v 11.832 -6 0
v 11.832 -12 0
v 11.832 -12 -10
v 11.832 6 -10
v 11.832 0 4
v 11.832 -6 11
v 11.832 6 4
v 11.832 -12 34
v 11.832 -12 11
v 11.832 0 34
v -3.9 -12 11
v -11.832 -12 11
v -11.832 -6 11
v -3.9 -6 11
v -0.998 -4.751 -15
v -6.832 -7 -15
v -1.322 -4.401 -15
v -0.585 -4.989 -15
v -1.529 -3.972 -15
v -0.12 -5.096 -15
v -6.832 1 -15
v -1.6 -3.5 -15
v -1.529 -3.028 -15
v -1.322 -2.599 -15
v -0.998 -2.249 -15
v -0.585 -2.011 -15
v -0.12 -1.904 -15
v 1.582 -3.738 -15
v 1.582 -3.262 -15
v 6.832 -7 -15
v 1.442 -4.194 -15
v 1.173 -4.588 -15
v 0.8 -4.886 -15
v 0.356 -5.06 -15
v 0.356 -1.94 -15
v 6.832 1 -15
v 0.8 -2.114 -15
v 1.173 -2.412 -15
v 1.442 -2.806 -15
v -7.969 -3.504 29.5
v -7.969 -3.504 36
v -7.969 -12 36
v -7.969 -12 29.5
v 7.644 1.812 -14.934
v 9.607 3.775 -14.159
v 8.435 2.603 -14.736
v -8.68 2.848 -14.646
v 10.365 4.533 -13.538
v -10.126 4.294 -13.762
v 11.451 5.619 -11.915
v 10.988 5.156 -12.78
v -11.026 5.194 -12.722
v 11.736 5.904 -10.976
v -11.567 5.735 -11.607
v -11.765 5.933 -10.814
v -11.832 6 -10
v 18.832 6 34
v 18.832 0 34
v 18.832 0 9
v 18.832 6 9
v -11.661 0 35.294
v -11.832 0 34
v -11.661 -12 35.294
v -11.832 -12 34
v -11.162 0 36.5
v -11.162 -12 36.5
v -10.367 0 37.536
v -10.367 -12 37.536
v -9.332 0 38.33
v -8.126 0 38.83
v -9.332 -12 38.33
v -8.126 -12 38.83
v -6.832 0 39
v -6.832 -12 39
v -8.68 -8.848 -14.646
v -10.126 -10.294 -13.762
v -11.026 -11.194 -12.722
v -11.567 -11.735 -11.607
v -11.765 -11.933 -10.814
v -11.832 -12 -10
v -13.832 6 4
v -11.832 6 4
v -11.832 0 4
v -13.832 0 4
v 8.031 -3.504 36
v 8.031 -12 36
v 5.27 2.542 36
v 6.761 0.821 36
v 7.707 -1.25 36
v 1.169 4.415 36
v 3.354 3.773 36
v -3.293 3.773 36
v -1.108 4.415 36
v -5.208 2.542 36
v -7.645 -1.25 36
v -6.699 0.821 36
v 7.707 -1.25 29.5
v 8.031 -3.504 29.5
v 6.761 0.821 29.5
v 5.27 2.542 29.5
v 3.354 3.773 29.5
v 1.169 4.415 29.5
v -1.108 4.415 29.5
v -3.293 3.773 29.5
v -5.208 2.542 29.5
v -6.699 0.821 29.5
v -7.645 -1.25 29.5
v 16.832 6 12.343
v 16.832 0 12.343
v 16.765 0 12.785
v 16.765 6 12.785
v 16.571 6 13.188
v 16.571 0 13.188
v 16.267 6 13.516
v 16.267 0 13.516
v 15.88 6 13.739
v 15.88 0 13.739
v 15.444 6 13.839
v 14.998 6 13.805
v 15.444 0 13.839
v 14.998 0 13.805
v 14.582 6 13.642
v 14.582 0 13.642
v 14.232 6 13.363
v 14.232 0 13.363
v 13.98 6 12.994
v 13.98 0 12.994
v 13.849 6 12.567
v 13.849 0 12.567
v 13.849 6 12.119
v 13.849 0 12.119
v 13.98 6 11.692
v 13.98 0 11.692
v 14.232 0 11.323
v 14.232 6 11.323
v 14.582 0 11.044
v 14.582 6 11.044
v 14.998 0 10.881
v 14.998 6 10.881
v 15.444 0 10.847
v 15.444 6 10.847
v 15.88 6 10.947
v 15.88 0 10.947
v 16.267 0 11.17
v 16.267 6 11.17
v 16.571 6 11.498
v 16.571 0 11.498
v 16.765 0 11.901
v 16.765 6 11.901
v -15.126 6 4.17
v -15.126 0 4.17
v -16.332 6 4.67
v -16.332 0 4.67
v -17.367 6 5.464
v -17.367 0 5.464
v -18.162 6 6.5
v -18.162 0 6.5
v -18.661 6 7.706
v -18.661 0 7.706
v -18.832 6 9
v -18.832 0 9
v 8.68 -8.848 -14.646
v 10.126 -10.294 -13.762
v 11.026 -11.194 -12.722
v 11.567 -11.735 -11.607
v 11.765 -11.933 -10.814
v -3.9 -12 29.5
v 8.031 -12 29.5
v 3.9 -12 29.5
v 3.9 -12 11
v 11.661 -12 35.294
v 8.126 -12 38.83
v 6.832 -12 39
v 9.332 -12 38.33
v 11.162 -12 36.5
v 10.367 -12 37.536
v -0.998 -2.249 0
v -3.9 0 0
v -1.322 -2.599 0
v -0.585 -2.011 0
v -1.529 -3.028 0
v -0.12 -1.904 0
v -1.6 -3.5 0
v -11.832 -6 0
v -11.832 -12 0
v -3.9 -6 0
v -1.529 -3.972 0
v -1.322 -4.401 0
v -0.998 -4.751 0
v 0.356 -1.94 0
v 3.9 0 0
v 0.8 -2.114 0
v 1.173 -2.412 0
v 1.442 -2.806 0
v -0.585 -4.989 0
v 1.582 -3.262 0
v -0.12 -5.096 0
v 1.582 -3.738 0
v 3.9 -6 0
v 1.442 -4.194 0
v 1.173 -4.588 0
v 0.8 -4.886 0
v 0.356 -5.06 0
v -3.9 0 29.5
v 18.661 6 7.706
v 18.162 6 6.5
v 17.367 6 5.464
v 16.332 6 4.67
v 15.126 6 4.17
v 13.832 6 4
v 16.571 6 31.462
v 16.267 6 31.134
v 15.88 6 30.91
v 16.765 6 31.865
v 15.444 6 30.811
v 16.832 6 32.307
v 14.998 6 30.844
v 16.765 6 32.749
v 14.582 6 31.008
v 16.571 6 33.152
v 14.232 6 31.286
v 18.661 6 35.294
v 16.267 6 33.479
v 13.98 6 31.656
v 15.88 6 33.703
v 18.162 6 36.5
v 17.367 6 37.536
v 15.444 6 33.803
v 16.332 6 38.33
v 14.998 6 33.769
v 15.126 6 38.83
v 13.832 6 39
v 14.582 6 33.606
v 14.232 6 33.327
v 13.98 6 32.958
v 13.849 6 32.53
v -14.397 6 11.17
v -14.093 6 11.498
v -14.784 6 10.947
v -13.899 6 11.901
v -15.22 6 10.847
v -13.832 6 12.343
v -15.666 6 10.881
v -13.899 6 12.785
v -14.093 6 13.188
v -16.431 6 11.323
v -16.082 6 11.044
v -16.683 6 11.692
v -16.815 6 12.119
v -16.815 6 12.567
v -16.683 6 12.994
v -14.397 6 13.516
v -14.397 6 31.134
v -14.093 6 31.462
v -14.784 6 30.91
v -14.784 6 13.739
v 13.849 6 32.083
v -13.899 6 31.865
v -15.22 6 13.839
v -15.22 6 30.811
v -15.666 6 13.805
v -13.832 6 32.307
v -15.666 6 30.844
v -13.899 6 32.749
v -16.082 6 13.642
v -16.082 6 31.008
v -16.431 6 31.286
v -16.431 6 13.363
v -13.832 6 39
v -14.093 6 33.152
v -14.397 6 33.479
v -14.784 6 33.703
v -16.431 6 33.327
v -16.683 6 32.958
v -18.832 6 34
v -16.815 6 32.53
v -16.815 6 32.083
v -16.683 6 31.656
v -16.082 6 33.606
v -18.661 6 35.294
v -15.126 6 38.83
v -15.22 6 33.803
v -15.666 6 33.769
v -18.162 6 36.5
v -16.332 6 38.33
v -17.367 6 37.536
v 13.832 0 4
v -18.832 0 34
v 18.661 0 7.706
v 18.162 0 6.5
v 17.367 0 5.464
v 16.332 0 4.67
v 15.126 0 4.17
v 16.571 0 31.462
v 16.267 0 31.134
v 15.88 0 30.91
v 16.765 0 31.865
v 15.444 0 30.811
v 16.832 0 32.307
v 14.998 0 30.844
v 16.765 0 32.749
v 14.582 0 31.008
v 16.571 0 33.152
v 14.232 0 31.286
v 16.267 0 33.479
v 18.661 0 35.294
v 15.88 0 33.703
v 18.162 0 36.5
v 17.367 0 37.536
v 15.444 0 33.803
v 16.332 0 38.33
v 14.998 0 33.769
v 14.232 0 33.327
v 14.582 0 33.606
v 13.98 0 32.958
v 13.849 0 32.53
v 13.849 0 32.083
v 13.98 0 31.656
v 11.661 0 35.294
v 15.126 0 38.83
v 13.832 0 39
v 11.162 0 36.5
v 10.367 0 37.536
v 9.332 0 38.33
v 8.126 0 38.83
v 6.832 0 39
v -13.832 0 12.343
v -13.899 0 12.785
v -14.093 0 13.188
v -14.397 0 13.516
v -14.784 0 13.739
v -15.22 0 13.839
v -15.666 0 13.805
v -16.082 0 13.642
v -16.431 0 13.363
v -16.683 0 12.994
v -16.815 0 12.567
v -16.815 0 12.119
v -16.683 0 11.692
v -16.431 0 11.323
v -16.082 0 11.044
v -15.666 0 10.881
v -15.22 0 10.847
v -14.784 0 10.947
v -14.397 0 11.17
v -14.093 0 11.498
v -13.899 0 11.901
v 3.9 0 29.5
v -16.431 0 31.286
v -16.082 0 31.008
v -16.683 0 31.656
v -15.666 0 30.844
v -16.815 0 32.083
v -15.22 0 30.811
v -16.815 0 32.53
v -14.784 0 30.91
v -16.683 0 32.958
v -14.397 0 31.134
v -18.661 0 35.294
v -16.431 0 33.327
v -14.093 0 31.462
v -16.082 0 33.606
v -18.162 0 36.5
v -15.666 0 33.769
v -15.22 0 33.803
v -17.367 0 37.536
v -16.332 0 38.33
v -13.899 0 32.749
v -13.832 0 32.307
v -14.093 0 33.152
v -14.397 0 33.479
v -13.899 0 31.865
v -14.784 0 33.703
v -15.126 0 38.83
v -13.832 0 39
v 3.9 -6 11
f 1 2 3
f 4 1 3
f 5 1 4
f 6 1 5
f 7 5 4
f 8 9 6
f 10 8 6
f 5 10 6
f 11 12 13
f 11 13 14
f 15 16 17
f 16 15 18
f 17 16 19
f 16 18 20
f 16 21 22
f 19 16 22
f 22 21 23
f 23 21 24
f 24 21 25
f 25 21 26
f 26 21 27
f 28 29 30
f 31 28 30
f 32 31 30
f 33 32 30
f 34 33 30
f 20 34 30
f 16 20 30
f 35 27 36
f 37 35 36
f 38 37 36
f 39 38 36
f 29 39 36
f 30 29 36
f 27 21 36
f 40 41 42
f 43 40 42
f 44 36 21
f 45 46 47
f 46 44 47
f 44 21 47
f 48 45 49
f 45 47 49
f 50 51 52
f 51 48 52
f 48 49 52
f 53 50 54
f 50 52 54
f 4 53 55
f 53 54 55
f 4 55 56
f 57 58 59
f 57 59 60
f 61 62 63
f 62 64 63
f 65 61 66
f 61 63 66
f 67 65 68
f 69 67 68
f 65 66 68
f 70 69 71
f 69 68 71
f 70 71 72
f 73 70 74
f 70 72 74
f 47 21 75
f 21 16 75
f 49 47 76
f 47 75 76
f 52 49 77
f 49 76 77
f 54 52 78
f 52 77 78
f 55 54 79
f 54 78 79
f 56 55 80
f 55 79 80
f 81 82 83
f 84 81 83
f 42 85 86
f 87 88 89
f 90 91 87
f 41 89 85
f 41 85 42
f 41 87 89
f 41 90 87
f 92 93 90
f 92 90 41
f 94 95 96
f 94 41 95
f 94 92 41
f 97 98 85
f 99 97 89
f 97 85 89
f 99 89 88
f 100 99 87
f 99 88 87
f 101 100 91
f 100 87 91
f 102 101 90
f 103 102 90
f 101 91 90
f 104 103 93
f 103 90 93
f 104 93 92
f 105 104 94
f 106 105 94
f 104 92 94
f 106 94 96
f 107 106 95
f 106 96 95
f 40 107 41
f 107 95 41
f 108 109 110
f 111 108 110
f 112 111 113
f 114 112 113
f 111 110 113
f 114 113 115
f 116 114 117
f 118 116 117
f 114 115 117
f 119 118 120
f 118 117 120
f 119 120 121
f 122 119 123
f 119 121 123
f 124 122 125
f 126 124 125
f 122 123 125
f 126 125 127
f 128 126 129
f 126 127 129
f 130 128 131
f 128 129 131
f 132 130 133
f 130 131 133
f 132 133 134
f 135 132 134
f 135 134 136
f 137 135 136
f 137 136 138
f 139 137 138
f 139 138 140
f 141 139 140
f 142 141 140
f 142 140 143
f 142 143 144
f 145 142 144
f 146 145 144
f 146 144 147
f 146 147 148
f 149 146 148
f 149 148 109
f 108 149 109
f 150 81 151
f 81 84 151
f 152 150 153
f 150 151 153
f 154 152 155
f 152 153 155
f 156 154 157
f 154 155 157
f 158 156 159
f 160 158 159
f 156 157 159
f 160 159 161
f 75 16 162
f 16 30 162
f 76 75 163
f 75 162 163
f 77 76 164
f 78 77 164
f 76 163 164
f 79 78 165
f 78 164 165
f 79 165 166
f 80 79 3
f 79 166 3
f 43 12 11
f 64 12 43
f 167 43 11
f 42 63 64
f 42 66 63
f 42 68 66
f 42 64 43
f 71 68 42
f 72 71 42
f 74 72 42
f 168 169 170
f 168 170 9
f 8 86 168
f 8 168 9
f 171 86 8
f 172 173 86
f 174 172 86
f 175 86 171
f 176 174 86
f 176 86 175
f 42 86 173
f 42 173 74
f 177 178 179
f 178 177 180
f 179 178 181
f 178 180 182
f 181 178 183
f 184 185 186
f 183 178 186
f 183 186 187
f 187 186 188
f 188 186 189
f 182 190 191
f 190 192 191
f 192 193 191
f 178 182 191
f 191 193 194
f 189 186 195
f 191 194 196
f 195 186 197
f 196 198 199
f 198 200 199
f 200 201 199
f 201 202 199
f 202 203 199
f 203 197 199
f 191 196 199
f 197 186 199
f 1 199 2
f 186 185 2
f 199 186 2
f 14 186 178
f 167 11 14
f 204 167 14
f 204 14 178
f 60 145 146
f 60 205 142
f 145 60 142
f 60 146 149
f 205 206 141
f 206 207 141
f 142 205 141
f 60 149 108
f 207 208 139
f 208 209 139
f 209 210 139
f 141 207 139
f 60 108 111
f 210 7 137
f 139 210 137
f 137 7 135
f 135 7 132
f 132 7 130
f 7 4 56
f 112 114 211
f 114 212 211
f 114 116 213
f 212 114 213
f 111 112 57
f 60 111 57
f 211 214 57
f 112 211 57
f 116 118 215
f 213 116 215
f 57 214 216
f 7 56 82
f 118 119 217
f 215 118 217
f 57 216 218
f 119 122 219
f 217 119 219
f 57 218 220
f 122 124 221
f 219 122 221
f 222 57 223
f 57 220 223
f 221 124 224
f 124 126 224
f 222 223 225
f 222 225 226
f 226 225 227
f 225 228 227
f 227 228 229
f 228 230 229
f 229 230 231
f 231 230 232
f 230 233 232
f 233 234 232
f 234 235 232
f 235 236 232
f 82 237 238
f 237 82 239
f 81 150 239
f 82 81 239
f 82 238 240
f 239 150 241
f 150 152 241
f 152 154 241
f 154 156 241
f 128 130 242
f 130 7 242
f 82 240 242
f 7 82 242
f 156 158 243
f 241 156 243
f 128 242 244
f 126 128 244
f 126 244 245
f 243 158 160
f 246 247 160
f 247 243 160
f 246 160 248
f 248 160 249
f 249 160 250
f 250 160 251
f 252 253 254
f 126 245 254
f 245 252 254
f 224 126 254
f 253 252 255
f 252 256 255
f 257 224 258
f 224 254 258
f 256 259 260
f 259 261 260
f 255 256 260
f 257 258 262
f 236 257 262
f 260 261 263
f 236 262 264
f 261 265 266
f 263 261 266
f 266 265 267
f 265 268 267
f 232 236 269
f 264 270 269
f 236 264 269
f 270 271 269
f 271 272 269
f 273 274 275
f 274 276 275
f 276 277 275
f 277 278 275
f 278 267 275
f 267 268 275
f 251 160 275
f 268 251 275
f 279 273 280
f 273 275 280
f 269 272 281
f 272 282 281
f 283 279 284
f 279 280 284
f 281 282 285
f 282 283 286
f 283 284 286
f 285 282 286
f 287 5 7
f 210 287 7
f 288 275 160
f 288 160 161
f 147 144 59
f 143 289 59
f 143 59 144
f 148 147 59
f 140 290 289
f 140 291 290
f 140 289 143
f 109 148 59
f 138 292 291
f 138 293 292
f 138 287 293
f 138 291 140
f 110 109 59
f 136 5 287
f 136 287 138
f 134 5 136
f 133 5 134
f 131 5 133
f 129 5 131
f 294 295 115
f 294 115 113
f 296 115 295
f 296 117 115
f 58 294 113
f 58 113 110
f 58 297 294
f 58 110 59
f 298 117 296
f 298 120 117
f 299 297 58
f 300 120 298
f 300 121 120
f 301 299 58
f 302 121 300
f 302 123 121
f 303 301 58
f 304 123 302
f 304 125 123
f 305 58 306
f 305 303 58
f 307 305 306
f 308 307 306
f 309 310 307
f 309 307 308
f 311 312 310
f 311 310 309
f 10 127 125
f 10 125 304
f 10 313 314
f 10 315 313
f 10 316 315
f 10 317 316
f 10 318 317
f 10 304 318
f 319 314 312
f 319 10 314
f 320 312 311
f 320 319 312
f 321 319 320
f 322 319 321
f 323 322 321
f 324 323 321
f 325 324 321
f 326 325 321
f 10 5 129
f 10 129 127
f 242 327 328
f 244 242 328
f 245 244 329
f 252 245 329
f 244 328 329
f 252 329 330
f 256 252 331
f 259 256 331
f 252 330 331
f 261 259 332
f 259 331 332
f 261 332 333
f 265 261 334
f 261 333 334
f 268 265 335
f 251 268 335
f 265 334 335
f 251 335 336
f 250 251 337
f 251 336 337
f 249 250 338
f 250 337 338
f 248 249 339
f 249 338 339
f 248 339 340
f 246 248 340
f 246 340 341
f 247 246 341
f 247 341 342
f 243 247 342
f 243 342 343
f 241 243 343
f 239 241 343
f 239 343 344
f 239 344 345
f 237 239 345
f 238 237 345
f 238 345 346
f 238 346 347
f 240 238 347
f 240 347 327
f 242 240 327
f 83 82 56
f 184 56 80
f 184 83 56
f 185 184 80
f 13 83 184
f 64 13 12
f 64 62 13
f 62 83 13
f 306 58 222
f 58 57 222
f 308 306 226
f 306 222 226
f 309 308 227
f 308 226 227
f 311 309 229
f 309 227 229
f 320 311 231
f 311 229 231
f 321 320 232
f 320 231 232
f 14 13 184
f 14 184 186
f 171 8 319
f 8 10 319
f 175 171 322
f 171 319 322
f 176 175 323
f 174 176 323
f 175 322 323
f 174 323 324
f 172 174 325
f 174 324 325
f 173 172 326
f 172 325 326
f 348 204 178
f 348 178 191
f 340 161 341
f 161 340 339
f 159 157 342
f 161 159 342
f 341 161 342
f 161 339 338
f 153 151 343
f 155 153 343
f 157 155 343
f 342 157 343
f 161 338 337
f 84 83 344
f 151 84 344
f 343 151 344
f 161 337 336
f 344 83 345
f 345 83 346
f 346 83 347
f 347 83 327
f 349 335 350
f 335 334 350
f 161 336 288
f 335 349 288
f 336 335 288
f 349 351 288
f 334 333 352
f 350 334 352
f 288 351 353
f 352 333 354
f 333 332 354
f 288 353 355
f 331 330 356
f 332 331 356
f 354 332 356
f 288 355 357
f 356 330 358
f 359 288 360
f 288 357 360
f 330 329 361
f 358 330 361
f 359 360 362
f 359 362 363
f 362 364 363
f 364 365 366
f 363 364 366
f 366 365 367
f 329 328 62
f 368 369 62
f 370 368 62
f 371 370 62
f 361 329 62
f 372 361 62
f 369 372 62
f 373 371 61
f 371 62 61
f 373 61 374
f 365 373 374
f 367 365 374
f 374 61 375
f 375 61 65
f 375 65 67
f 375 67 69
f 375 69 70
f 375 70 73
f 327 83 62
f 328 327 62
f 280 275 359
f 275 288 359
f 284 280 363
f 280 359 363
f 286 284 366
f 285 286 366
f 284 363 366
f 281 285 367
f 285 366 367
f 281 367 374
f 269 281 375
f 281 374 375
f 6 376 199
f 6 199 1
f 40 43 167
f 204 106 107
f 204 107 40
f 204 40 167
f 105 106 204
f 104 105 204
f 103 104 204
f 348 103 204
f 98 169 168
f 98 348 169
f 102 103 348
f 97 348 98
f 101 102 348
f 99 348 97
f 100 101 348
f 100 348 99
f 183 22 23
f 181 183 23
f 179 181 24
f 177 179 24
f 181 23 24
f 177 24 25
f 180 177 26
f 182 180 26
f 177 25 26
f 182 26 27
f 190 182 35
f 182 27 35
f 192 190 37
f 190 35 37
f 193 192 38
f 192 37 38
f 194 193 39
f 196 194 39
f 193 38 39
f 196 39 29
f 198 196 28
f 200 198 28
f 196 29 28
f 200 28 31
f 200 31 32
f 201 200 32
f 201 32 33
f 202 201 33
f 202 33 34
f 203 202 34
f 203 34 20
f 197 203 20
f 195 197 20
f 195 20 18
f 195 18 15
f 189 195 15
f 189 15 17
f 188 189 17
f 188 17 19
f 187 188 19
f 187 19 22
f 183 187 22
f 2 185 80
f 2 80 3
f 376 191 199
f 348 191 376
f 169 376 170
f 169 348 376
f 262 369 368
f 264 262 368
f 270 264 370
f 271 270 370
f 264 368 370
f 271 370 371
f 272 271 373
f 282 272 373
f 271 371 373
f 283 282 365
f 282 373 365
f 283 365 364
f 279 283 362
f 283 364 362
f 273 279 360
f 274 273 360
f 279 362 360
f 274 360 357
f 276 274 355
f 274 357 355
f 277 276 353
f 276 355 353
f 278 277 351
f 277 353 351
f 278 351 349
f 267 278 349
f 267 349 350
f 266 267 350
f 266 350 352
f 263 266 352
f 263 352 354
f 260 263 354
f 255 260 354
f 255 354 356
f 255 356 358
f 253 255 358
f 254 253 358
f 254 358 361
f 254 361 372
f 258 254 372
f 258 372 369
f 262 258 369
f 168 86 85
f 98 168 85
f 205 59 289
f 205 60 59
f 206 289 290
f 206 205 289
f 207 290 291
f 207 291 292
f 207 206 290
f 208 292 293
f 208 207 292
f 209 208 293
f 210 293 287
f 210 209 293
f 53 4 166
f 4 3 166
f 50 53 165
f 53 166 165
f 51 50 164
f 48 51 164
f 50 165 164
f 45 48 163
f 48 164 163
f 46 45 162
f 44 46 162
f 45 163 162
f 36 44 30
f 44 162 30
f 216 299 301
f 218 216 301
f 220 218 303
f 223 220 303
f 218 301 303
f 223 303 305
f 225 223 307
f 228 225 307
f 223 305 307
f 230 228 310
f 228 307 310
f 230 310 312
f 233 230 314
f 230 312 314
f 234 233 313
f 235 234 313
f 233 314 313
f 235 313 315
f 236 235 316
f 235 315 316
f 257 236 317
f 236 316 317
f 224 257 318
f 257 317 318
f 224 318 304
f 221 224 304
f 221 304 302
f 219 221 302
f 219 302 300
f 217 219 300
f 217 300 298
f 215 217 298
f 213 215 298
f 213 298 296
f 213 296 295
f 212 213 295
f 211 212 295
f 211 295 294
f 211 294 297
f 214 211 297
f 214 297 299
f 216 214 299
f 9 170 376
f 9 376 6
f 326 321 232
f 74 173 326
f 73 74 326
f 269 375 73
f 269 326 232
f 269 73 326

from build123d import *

# Parameters (mm, degrees)
F1_DEPTH      = 39
F1_DEPTH_BACK = 15
F2_W          = 23.6637403975
F2_H          = 12
F3_DEPTH      = 15
F4_D          = 3.2
F5_W          = 7.9318701987
F5_H          = 11
F6_DEPTH      = 6
F9_DEPTH      = 6.5
F10_DEPTH     = 12
F11_W         = 6
F11_H         = 35
F12_DEPTH     = 7
F13_W         = 6
F13_H         = 35
F14_DEPTH     = 7
F15_R         = 5
F16_R         = 5
F18_D         = 3


with BuildPart() as f1:
    # F0 (on Top) → F1 (new body, two sides)
    with BuildSketch(Plane.XY) as f1_sk:
        Polygon((-11.8318701987, 6), (-11.8318701987, 0), (-11.8318701987, -2.6806737598), (-11.8318701987, -12), (-3.9, -12), (-3.9, 0), (0, 0), (3.9, 0), (3.9, -12), (11.8318701987, -12), (11.8318701987, -2.6806737598), (11.8318701987, 0), (11.8318701987, 6), (0, 6), align=None)
    extrude(amount=F1_DEPTH)
    extrude(f1_sk.sketch, amount=-F1_DEPTH_BACK)

    # F2 (on Top) → F3 (join, through all)
    with BuildSketch(Plane.XY):
        with Locations((0, -6)):
            Rectangle(F2_W, F2_H)
    extrude(amount=-F3_DEPTH)

    # F4 (through all)
    with Locations(Plane.XY):
        with Locations((0, -3.5)):
            Hole(F4_D / 2)

    # F5 (on face) → F6 (cut)
    with BuildSketch(Plane.XZ.offset(12)):
        with Locations((7.8659350994, 5.5)):
            Rectangle(F5_W, F5_H)
        with Locations((-7.8659350994, 5.5)):
            Rectangle(F5_W, F5_H)
    extrude(amount=-F6_DEPTH, mode=Mode.SUBTRACT)

    # F8 (on offset) → F9 (cut)
    with BuildSketch(Plane.XY.offset(36)):
        with BuildLine():
            Line((8.0307415794, -12), (8.0307415794, -3.5038522084))
            ThreePointArc((8.0307415794, -3.5038522084), (0.0307415794, 4.4961477916), (-7.9692584206, -3.5038522084))
            Line((-7.9692584206, -3.5038522084), (-7.9692584206, -12))
            Line((-7.9692584206, -12), (3.9, -12))
            Line((3.9, -12), (8.0307415794, -12))
        make_face()
    extrude(amount=-F9_DEPTH, mode=Mode.SUBTRACT)

    # F10 (add, through all): a face of the model
    f10_faces = [f1.faces().sort_by_distance(p)[0] for p in [
        (0, 0, 37.5),
    ]]
    extrude(f10_faces, amount=F10_DEPTH)

    # F11 (on face) → F12 (join)
    with BuildSketch(Plane(origin=(-11.8318701987, 0, 0), x_dir=(0, -1, 0), z_dir=(-1, 0, 0))):
        with Locations((-3, 21.5)):
            Rectangle(F11_W, F11_H)
    extrude(amount=F12_DEPTH)

    # F13 (on face) → F14 (join)
    with BuildSketch(Plane.YZ.offset(11.8318701987)):
        with Locations((3, 21.5)):
            Rectangle(F13_W, F13_H)
    extrude(amount=F14_DEPTH)

    # F15
    f15_edges = [f1.edges().sort_by_distance(p)[0] for p in [
        (-18.83187, 3, 39),
        (-18.83187, 3, 4),
        (18.83187, 3, 4),
        (18.83187, 3, 39),
        (-11.83187, -6, 39),
        (11.83187, -6, 39),
    ]]
    fillet(f15_edges, radius=F15_R)

    # F16
    f16_edges = [f1.edges().sort_by_distance(p)[0] for p in [
        (-11.83187, -3, -15),
        (0, -12, -15),
        (11.83187, -3, -15),
        (0, 6, -15),
    ]]
    fillet(f16_edges, radius=F16_R)

    # F18 (through all)
    with Locations(Plane(origin=(0, 6, 0), x_dir=(-1, 0, 0), z_dir=(0, 1, 0))):
        with Locations((-15.3318701987, 32.3067344725), (-15.3318701987, 12.3429447412), (15.3318701987, 12.3429447412), (15.3318701987, 32.3067344725)):
            Hole(F18_D / 2)


solid = f1.part
